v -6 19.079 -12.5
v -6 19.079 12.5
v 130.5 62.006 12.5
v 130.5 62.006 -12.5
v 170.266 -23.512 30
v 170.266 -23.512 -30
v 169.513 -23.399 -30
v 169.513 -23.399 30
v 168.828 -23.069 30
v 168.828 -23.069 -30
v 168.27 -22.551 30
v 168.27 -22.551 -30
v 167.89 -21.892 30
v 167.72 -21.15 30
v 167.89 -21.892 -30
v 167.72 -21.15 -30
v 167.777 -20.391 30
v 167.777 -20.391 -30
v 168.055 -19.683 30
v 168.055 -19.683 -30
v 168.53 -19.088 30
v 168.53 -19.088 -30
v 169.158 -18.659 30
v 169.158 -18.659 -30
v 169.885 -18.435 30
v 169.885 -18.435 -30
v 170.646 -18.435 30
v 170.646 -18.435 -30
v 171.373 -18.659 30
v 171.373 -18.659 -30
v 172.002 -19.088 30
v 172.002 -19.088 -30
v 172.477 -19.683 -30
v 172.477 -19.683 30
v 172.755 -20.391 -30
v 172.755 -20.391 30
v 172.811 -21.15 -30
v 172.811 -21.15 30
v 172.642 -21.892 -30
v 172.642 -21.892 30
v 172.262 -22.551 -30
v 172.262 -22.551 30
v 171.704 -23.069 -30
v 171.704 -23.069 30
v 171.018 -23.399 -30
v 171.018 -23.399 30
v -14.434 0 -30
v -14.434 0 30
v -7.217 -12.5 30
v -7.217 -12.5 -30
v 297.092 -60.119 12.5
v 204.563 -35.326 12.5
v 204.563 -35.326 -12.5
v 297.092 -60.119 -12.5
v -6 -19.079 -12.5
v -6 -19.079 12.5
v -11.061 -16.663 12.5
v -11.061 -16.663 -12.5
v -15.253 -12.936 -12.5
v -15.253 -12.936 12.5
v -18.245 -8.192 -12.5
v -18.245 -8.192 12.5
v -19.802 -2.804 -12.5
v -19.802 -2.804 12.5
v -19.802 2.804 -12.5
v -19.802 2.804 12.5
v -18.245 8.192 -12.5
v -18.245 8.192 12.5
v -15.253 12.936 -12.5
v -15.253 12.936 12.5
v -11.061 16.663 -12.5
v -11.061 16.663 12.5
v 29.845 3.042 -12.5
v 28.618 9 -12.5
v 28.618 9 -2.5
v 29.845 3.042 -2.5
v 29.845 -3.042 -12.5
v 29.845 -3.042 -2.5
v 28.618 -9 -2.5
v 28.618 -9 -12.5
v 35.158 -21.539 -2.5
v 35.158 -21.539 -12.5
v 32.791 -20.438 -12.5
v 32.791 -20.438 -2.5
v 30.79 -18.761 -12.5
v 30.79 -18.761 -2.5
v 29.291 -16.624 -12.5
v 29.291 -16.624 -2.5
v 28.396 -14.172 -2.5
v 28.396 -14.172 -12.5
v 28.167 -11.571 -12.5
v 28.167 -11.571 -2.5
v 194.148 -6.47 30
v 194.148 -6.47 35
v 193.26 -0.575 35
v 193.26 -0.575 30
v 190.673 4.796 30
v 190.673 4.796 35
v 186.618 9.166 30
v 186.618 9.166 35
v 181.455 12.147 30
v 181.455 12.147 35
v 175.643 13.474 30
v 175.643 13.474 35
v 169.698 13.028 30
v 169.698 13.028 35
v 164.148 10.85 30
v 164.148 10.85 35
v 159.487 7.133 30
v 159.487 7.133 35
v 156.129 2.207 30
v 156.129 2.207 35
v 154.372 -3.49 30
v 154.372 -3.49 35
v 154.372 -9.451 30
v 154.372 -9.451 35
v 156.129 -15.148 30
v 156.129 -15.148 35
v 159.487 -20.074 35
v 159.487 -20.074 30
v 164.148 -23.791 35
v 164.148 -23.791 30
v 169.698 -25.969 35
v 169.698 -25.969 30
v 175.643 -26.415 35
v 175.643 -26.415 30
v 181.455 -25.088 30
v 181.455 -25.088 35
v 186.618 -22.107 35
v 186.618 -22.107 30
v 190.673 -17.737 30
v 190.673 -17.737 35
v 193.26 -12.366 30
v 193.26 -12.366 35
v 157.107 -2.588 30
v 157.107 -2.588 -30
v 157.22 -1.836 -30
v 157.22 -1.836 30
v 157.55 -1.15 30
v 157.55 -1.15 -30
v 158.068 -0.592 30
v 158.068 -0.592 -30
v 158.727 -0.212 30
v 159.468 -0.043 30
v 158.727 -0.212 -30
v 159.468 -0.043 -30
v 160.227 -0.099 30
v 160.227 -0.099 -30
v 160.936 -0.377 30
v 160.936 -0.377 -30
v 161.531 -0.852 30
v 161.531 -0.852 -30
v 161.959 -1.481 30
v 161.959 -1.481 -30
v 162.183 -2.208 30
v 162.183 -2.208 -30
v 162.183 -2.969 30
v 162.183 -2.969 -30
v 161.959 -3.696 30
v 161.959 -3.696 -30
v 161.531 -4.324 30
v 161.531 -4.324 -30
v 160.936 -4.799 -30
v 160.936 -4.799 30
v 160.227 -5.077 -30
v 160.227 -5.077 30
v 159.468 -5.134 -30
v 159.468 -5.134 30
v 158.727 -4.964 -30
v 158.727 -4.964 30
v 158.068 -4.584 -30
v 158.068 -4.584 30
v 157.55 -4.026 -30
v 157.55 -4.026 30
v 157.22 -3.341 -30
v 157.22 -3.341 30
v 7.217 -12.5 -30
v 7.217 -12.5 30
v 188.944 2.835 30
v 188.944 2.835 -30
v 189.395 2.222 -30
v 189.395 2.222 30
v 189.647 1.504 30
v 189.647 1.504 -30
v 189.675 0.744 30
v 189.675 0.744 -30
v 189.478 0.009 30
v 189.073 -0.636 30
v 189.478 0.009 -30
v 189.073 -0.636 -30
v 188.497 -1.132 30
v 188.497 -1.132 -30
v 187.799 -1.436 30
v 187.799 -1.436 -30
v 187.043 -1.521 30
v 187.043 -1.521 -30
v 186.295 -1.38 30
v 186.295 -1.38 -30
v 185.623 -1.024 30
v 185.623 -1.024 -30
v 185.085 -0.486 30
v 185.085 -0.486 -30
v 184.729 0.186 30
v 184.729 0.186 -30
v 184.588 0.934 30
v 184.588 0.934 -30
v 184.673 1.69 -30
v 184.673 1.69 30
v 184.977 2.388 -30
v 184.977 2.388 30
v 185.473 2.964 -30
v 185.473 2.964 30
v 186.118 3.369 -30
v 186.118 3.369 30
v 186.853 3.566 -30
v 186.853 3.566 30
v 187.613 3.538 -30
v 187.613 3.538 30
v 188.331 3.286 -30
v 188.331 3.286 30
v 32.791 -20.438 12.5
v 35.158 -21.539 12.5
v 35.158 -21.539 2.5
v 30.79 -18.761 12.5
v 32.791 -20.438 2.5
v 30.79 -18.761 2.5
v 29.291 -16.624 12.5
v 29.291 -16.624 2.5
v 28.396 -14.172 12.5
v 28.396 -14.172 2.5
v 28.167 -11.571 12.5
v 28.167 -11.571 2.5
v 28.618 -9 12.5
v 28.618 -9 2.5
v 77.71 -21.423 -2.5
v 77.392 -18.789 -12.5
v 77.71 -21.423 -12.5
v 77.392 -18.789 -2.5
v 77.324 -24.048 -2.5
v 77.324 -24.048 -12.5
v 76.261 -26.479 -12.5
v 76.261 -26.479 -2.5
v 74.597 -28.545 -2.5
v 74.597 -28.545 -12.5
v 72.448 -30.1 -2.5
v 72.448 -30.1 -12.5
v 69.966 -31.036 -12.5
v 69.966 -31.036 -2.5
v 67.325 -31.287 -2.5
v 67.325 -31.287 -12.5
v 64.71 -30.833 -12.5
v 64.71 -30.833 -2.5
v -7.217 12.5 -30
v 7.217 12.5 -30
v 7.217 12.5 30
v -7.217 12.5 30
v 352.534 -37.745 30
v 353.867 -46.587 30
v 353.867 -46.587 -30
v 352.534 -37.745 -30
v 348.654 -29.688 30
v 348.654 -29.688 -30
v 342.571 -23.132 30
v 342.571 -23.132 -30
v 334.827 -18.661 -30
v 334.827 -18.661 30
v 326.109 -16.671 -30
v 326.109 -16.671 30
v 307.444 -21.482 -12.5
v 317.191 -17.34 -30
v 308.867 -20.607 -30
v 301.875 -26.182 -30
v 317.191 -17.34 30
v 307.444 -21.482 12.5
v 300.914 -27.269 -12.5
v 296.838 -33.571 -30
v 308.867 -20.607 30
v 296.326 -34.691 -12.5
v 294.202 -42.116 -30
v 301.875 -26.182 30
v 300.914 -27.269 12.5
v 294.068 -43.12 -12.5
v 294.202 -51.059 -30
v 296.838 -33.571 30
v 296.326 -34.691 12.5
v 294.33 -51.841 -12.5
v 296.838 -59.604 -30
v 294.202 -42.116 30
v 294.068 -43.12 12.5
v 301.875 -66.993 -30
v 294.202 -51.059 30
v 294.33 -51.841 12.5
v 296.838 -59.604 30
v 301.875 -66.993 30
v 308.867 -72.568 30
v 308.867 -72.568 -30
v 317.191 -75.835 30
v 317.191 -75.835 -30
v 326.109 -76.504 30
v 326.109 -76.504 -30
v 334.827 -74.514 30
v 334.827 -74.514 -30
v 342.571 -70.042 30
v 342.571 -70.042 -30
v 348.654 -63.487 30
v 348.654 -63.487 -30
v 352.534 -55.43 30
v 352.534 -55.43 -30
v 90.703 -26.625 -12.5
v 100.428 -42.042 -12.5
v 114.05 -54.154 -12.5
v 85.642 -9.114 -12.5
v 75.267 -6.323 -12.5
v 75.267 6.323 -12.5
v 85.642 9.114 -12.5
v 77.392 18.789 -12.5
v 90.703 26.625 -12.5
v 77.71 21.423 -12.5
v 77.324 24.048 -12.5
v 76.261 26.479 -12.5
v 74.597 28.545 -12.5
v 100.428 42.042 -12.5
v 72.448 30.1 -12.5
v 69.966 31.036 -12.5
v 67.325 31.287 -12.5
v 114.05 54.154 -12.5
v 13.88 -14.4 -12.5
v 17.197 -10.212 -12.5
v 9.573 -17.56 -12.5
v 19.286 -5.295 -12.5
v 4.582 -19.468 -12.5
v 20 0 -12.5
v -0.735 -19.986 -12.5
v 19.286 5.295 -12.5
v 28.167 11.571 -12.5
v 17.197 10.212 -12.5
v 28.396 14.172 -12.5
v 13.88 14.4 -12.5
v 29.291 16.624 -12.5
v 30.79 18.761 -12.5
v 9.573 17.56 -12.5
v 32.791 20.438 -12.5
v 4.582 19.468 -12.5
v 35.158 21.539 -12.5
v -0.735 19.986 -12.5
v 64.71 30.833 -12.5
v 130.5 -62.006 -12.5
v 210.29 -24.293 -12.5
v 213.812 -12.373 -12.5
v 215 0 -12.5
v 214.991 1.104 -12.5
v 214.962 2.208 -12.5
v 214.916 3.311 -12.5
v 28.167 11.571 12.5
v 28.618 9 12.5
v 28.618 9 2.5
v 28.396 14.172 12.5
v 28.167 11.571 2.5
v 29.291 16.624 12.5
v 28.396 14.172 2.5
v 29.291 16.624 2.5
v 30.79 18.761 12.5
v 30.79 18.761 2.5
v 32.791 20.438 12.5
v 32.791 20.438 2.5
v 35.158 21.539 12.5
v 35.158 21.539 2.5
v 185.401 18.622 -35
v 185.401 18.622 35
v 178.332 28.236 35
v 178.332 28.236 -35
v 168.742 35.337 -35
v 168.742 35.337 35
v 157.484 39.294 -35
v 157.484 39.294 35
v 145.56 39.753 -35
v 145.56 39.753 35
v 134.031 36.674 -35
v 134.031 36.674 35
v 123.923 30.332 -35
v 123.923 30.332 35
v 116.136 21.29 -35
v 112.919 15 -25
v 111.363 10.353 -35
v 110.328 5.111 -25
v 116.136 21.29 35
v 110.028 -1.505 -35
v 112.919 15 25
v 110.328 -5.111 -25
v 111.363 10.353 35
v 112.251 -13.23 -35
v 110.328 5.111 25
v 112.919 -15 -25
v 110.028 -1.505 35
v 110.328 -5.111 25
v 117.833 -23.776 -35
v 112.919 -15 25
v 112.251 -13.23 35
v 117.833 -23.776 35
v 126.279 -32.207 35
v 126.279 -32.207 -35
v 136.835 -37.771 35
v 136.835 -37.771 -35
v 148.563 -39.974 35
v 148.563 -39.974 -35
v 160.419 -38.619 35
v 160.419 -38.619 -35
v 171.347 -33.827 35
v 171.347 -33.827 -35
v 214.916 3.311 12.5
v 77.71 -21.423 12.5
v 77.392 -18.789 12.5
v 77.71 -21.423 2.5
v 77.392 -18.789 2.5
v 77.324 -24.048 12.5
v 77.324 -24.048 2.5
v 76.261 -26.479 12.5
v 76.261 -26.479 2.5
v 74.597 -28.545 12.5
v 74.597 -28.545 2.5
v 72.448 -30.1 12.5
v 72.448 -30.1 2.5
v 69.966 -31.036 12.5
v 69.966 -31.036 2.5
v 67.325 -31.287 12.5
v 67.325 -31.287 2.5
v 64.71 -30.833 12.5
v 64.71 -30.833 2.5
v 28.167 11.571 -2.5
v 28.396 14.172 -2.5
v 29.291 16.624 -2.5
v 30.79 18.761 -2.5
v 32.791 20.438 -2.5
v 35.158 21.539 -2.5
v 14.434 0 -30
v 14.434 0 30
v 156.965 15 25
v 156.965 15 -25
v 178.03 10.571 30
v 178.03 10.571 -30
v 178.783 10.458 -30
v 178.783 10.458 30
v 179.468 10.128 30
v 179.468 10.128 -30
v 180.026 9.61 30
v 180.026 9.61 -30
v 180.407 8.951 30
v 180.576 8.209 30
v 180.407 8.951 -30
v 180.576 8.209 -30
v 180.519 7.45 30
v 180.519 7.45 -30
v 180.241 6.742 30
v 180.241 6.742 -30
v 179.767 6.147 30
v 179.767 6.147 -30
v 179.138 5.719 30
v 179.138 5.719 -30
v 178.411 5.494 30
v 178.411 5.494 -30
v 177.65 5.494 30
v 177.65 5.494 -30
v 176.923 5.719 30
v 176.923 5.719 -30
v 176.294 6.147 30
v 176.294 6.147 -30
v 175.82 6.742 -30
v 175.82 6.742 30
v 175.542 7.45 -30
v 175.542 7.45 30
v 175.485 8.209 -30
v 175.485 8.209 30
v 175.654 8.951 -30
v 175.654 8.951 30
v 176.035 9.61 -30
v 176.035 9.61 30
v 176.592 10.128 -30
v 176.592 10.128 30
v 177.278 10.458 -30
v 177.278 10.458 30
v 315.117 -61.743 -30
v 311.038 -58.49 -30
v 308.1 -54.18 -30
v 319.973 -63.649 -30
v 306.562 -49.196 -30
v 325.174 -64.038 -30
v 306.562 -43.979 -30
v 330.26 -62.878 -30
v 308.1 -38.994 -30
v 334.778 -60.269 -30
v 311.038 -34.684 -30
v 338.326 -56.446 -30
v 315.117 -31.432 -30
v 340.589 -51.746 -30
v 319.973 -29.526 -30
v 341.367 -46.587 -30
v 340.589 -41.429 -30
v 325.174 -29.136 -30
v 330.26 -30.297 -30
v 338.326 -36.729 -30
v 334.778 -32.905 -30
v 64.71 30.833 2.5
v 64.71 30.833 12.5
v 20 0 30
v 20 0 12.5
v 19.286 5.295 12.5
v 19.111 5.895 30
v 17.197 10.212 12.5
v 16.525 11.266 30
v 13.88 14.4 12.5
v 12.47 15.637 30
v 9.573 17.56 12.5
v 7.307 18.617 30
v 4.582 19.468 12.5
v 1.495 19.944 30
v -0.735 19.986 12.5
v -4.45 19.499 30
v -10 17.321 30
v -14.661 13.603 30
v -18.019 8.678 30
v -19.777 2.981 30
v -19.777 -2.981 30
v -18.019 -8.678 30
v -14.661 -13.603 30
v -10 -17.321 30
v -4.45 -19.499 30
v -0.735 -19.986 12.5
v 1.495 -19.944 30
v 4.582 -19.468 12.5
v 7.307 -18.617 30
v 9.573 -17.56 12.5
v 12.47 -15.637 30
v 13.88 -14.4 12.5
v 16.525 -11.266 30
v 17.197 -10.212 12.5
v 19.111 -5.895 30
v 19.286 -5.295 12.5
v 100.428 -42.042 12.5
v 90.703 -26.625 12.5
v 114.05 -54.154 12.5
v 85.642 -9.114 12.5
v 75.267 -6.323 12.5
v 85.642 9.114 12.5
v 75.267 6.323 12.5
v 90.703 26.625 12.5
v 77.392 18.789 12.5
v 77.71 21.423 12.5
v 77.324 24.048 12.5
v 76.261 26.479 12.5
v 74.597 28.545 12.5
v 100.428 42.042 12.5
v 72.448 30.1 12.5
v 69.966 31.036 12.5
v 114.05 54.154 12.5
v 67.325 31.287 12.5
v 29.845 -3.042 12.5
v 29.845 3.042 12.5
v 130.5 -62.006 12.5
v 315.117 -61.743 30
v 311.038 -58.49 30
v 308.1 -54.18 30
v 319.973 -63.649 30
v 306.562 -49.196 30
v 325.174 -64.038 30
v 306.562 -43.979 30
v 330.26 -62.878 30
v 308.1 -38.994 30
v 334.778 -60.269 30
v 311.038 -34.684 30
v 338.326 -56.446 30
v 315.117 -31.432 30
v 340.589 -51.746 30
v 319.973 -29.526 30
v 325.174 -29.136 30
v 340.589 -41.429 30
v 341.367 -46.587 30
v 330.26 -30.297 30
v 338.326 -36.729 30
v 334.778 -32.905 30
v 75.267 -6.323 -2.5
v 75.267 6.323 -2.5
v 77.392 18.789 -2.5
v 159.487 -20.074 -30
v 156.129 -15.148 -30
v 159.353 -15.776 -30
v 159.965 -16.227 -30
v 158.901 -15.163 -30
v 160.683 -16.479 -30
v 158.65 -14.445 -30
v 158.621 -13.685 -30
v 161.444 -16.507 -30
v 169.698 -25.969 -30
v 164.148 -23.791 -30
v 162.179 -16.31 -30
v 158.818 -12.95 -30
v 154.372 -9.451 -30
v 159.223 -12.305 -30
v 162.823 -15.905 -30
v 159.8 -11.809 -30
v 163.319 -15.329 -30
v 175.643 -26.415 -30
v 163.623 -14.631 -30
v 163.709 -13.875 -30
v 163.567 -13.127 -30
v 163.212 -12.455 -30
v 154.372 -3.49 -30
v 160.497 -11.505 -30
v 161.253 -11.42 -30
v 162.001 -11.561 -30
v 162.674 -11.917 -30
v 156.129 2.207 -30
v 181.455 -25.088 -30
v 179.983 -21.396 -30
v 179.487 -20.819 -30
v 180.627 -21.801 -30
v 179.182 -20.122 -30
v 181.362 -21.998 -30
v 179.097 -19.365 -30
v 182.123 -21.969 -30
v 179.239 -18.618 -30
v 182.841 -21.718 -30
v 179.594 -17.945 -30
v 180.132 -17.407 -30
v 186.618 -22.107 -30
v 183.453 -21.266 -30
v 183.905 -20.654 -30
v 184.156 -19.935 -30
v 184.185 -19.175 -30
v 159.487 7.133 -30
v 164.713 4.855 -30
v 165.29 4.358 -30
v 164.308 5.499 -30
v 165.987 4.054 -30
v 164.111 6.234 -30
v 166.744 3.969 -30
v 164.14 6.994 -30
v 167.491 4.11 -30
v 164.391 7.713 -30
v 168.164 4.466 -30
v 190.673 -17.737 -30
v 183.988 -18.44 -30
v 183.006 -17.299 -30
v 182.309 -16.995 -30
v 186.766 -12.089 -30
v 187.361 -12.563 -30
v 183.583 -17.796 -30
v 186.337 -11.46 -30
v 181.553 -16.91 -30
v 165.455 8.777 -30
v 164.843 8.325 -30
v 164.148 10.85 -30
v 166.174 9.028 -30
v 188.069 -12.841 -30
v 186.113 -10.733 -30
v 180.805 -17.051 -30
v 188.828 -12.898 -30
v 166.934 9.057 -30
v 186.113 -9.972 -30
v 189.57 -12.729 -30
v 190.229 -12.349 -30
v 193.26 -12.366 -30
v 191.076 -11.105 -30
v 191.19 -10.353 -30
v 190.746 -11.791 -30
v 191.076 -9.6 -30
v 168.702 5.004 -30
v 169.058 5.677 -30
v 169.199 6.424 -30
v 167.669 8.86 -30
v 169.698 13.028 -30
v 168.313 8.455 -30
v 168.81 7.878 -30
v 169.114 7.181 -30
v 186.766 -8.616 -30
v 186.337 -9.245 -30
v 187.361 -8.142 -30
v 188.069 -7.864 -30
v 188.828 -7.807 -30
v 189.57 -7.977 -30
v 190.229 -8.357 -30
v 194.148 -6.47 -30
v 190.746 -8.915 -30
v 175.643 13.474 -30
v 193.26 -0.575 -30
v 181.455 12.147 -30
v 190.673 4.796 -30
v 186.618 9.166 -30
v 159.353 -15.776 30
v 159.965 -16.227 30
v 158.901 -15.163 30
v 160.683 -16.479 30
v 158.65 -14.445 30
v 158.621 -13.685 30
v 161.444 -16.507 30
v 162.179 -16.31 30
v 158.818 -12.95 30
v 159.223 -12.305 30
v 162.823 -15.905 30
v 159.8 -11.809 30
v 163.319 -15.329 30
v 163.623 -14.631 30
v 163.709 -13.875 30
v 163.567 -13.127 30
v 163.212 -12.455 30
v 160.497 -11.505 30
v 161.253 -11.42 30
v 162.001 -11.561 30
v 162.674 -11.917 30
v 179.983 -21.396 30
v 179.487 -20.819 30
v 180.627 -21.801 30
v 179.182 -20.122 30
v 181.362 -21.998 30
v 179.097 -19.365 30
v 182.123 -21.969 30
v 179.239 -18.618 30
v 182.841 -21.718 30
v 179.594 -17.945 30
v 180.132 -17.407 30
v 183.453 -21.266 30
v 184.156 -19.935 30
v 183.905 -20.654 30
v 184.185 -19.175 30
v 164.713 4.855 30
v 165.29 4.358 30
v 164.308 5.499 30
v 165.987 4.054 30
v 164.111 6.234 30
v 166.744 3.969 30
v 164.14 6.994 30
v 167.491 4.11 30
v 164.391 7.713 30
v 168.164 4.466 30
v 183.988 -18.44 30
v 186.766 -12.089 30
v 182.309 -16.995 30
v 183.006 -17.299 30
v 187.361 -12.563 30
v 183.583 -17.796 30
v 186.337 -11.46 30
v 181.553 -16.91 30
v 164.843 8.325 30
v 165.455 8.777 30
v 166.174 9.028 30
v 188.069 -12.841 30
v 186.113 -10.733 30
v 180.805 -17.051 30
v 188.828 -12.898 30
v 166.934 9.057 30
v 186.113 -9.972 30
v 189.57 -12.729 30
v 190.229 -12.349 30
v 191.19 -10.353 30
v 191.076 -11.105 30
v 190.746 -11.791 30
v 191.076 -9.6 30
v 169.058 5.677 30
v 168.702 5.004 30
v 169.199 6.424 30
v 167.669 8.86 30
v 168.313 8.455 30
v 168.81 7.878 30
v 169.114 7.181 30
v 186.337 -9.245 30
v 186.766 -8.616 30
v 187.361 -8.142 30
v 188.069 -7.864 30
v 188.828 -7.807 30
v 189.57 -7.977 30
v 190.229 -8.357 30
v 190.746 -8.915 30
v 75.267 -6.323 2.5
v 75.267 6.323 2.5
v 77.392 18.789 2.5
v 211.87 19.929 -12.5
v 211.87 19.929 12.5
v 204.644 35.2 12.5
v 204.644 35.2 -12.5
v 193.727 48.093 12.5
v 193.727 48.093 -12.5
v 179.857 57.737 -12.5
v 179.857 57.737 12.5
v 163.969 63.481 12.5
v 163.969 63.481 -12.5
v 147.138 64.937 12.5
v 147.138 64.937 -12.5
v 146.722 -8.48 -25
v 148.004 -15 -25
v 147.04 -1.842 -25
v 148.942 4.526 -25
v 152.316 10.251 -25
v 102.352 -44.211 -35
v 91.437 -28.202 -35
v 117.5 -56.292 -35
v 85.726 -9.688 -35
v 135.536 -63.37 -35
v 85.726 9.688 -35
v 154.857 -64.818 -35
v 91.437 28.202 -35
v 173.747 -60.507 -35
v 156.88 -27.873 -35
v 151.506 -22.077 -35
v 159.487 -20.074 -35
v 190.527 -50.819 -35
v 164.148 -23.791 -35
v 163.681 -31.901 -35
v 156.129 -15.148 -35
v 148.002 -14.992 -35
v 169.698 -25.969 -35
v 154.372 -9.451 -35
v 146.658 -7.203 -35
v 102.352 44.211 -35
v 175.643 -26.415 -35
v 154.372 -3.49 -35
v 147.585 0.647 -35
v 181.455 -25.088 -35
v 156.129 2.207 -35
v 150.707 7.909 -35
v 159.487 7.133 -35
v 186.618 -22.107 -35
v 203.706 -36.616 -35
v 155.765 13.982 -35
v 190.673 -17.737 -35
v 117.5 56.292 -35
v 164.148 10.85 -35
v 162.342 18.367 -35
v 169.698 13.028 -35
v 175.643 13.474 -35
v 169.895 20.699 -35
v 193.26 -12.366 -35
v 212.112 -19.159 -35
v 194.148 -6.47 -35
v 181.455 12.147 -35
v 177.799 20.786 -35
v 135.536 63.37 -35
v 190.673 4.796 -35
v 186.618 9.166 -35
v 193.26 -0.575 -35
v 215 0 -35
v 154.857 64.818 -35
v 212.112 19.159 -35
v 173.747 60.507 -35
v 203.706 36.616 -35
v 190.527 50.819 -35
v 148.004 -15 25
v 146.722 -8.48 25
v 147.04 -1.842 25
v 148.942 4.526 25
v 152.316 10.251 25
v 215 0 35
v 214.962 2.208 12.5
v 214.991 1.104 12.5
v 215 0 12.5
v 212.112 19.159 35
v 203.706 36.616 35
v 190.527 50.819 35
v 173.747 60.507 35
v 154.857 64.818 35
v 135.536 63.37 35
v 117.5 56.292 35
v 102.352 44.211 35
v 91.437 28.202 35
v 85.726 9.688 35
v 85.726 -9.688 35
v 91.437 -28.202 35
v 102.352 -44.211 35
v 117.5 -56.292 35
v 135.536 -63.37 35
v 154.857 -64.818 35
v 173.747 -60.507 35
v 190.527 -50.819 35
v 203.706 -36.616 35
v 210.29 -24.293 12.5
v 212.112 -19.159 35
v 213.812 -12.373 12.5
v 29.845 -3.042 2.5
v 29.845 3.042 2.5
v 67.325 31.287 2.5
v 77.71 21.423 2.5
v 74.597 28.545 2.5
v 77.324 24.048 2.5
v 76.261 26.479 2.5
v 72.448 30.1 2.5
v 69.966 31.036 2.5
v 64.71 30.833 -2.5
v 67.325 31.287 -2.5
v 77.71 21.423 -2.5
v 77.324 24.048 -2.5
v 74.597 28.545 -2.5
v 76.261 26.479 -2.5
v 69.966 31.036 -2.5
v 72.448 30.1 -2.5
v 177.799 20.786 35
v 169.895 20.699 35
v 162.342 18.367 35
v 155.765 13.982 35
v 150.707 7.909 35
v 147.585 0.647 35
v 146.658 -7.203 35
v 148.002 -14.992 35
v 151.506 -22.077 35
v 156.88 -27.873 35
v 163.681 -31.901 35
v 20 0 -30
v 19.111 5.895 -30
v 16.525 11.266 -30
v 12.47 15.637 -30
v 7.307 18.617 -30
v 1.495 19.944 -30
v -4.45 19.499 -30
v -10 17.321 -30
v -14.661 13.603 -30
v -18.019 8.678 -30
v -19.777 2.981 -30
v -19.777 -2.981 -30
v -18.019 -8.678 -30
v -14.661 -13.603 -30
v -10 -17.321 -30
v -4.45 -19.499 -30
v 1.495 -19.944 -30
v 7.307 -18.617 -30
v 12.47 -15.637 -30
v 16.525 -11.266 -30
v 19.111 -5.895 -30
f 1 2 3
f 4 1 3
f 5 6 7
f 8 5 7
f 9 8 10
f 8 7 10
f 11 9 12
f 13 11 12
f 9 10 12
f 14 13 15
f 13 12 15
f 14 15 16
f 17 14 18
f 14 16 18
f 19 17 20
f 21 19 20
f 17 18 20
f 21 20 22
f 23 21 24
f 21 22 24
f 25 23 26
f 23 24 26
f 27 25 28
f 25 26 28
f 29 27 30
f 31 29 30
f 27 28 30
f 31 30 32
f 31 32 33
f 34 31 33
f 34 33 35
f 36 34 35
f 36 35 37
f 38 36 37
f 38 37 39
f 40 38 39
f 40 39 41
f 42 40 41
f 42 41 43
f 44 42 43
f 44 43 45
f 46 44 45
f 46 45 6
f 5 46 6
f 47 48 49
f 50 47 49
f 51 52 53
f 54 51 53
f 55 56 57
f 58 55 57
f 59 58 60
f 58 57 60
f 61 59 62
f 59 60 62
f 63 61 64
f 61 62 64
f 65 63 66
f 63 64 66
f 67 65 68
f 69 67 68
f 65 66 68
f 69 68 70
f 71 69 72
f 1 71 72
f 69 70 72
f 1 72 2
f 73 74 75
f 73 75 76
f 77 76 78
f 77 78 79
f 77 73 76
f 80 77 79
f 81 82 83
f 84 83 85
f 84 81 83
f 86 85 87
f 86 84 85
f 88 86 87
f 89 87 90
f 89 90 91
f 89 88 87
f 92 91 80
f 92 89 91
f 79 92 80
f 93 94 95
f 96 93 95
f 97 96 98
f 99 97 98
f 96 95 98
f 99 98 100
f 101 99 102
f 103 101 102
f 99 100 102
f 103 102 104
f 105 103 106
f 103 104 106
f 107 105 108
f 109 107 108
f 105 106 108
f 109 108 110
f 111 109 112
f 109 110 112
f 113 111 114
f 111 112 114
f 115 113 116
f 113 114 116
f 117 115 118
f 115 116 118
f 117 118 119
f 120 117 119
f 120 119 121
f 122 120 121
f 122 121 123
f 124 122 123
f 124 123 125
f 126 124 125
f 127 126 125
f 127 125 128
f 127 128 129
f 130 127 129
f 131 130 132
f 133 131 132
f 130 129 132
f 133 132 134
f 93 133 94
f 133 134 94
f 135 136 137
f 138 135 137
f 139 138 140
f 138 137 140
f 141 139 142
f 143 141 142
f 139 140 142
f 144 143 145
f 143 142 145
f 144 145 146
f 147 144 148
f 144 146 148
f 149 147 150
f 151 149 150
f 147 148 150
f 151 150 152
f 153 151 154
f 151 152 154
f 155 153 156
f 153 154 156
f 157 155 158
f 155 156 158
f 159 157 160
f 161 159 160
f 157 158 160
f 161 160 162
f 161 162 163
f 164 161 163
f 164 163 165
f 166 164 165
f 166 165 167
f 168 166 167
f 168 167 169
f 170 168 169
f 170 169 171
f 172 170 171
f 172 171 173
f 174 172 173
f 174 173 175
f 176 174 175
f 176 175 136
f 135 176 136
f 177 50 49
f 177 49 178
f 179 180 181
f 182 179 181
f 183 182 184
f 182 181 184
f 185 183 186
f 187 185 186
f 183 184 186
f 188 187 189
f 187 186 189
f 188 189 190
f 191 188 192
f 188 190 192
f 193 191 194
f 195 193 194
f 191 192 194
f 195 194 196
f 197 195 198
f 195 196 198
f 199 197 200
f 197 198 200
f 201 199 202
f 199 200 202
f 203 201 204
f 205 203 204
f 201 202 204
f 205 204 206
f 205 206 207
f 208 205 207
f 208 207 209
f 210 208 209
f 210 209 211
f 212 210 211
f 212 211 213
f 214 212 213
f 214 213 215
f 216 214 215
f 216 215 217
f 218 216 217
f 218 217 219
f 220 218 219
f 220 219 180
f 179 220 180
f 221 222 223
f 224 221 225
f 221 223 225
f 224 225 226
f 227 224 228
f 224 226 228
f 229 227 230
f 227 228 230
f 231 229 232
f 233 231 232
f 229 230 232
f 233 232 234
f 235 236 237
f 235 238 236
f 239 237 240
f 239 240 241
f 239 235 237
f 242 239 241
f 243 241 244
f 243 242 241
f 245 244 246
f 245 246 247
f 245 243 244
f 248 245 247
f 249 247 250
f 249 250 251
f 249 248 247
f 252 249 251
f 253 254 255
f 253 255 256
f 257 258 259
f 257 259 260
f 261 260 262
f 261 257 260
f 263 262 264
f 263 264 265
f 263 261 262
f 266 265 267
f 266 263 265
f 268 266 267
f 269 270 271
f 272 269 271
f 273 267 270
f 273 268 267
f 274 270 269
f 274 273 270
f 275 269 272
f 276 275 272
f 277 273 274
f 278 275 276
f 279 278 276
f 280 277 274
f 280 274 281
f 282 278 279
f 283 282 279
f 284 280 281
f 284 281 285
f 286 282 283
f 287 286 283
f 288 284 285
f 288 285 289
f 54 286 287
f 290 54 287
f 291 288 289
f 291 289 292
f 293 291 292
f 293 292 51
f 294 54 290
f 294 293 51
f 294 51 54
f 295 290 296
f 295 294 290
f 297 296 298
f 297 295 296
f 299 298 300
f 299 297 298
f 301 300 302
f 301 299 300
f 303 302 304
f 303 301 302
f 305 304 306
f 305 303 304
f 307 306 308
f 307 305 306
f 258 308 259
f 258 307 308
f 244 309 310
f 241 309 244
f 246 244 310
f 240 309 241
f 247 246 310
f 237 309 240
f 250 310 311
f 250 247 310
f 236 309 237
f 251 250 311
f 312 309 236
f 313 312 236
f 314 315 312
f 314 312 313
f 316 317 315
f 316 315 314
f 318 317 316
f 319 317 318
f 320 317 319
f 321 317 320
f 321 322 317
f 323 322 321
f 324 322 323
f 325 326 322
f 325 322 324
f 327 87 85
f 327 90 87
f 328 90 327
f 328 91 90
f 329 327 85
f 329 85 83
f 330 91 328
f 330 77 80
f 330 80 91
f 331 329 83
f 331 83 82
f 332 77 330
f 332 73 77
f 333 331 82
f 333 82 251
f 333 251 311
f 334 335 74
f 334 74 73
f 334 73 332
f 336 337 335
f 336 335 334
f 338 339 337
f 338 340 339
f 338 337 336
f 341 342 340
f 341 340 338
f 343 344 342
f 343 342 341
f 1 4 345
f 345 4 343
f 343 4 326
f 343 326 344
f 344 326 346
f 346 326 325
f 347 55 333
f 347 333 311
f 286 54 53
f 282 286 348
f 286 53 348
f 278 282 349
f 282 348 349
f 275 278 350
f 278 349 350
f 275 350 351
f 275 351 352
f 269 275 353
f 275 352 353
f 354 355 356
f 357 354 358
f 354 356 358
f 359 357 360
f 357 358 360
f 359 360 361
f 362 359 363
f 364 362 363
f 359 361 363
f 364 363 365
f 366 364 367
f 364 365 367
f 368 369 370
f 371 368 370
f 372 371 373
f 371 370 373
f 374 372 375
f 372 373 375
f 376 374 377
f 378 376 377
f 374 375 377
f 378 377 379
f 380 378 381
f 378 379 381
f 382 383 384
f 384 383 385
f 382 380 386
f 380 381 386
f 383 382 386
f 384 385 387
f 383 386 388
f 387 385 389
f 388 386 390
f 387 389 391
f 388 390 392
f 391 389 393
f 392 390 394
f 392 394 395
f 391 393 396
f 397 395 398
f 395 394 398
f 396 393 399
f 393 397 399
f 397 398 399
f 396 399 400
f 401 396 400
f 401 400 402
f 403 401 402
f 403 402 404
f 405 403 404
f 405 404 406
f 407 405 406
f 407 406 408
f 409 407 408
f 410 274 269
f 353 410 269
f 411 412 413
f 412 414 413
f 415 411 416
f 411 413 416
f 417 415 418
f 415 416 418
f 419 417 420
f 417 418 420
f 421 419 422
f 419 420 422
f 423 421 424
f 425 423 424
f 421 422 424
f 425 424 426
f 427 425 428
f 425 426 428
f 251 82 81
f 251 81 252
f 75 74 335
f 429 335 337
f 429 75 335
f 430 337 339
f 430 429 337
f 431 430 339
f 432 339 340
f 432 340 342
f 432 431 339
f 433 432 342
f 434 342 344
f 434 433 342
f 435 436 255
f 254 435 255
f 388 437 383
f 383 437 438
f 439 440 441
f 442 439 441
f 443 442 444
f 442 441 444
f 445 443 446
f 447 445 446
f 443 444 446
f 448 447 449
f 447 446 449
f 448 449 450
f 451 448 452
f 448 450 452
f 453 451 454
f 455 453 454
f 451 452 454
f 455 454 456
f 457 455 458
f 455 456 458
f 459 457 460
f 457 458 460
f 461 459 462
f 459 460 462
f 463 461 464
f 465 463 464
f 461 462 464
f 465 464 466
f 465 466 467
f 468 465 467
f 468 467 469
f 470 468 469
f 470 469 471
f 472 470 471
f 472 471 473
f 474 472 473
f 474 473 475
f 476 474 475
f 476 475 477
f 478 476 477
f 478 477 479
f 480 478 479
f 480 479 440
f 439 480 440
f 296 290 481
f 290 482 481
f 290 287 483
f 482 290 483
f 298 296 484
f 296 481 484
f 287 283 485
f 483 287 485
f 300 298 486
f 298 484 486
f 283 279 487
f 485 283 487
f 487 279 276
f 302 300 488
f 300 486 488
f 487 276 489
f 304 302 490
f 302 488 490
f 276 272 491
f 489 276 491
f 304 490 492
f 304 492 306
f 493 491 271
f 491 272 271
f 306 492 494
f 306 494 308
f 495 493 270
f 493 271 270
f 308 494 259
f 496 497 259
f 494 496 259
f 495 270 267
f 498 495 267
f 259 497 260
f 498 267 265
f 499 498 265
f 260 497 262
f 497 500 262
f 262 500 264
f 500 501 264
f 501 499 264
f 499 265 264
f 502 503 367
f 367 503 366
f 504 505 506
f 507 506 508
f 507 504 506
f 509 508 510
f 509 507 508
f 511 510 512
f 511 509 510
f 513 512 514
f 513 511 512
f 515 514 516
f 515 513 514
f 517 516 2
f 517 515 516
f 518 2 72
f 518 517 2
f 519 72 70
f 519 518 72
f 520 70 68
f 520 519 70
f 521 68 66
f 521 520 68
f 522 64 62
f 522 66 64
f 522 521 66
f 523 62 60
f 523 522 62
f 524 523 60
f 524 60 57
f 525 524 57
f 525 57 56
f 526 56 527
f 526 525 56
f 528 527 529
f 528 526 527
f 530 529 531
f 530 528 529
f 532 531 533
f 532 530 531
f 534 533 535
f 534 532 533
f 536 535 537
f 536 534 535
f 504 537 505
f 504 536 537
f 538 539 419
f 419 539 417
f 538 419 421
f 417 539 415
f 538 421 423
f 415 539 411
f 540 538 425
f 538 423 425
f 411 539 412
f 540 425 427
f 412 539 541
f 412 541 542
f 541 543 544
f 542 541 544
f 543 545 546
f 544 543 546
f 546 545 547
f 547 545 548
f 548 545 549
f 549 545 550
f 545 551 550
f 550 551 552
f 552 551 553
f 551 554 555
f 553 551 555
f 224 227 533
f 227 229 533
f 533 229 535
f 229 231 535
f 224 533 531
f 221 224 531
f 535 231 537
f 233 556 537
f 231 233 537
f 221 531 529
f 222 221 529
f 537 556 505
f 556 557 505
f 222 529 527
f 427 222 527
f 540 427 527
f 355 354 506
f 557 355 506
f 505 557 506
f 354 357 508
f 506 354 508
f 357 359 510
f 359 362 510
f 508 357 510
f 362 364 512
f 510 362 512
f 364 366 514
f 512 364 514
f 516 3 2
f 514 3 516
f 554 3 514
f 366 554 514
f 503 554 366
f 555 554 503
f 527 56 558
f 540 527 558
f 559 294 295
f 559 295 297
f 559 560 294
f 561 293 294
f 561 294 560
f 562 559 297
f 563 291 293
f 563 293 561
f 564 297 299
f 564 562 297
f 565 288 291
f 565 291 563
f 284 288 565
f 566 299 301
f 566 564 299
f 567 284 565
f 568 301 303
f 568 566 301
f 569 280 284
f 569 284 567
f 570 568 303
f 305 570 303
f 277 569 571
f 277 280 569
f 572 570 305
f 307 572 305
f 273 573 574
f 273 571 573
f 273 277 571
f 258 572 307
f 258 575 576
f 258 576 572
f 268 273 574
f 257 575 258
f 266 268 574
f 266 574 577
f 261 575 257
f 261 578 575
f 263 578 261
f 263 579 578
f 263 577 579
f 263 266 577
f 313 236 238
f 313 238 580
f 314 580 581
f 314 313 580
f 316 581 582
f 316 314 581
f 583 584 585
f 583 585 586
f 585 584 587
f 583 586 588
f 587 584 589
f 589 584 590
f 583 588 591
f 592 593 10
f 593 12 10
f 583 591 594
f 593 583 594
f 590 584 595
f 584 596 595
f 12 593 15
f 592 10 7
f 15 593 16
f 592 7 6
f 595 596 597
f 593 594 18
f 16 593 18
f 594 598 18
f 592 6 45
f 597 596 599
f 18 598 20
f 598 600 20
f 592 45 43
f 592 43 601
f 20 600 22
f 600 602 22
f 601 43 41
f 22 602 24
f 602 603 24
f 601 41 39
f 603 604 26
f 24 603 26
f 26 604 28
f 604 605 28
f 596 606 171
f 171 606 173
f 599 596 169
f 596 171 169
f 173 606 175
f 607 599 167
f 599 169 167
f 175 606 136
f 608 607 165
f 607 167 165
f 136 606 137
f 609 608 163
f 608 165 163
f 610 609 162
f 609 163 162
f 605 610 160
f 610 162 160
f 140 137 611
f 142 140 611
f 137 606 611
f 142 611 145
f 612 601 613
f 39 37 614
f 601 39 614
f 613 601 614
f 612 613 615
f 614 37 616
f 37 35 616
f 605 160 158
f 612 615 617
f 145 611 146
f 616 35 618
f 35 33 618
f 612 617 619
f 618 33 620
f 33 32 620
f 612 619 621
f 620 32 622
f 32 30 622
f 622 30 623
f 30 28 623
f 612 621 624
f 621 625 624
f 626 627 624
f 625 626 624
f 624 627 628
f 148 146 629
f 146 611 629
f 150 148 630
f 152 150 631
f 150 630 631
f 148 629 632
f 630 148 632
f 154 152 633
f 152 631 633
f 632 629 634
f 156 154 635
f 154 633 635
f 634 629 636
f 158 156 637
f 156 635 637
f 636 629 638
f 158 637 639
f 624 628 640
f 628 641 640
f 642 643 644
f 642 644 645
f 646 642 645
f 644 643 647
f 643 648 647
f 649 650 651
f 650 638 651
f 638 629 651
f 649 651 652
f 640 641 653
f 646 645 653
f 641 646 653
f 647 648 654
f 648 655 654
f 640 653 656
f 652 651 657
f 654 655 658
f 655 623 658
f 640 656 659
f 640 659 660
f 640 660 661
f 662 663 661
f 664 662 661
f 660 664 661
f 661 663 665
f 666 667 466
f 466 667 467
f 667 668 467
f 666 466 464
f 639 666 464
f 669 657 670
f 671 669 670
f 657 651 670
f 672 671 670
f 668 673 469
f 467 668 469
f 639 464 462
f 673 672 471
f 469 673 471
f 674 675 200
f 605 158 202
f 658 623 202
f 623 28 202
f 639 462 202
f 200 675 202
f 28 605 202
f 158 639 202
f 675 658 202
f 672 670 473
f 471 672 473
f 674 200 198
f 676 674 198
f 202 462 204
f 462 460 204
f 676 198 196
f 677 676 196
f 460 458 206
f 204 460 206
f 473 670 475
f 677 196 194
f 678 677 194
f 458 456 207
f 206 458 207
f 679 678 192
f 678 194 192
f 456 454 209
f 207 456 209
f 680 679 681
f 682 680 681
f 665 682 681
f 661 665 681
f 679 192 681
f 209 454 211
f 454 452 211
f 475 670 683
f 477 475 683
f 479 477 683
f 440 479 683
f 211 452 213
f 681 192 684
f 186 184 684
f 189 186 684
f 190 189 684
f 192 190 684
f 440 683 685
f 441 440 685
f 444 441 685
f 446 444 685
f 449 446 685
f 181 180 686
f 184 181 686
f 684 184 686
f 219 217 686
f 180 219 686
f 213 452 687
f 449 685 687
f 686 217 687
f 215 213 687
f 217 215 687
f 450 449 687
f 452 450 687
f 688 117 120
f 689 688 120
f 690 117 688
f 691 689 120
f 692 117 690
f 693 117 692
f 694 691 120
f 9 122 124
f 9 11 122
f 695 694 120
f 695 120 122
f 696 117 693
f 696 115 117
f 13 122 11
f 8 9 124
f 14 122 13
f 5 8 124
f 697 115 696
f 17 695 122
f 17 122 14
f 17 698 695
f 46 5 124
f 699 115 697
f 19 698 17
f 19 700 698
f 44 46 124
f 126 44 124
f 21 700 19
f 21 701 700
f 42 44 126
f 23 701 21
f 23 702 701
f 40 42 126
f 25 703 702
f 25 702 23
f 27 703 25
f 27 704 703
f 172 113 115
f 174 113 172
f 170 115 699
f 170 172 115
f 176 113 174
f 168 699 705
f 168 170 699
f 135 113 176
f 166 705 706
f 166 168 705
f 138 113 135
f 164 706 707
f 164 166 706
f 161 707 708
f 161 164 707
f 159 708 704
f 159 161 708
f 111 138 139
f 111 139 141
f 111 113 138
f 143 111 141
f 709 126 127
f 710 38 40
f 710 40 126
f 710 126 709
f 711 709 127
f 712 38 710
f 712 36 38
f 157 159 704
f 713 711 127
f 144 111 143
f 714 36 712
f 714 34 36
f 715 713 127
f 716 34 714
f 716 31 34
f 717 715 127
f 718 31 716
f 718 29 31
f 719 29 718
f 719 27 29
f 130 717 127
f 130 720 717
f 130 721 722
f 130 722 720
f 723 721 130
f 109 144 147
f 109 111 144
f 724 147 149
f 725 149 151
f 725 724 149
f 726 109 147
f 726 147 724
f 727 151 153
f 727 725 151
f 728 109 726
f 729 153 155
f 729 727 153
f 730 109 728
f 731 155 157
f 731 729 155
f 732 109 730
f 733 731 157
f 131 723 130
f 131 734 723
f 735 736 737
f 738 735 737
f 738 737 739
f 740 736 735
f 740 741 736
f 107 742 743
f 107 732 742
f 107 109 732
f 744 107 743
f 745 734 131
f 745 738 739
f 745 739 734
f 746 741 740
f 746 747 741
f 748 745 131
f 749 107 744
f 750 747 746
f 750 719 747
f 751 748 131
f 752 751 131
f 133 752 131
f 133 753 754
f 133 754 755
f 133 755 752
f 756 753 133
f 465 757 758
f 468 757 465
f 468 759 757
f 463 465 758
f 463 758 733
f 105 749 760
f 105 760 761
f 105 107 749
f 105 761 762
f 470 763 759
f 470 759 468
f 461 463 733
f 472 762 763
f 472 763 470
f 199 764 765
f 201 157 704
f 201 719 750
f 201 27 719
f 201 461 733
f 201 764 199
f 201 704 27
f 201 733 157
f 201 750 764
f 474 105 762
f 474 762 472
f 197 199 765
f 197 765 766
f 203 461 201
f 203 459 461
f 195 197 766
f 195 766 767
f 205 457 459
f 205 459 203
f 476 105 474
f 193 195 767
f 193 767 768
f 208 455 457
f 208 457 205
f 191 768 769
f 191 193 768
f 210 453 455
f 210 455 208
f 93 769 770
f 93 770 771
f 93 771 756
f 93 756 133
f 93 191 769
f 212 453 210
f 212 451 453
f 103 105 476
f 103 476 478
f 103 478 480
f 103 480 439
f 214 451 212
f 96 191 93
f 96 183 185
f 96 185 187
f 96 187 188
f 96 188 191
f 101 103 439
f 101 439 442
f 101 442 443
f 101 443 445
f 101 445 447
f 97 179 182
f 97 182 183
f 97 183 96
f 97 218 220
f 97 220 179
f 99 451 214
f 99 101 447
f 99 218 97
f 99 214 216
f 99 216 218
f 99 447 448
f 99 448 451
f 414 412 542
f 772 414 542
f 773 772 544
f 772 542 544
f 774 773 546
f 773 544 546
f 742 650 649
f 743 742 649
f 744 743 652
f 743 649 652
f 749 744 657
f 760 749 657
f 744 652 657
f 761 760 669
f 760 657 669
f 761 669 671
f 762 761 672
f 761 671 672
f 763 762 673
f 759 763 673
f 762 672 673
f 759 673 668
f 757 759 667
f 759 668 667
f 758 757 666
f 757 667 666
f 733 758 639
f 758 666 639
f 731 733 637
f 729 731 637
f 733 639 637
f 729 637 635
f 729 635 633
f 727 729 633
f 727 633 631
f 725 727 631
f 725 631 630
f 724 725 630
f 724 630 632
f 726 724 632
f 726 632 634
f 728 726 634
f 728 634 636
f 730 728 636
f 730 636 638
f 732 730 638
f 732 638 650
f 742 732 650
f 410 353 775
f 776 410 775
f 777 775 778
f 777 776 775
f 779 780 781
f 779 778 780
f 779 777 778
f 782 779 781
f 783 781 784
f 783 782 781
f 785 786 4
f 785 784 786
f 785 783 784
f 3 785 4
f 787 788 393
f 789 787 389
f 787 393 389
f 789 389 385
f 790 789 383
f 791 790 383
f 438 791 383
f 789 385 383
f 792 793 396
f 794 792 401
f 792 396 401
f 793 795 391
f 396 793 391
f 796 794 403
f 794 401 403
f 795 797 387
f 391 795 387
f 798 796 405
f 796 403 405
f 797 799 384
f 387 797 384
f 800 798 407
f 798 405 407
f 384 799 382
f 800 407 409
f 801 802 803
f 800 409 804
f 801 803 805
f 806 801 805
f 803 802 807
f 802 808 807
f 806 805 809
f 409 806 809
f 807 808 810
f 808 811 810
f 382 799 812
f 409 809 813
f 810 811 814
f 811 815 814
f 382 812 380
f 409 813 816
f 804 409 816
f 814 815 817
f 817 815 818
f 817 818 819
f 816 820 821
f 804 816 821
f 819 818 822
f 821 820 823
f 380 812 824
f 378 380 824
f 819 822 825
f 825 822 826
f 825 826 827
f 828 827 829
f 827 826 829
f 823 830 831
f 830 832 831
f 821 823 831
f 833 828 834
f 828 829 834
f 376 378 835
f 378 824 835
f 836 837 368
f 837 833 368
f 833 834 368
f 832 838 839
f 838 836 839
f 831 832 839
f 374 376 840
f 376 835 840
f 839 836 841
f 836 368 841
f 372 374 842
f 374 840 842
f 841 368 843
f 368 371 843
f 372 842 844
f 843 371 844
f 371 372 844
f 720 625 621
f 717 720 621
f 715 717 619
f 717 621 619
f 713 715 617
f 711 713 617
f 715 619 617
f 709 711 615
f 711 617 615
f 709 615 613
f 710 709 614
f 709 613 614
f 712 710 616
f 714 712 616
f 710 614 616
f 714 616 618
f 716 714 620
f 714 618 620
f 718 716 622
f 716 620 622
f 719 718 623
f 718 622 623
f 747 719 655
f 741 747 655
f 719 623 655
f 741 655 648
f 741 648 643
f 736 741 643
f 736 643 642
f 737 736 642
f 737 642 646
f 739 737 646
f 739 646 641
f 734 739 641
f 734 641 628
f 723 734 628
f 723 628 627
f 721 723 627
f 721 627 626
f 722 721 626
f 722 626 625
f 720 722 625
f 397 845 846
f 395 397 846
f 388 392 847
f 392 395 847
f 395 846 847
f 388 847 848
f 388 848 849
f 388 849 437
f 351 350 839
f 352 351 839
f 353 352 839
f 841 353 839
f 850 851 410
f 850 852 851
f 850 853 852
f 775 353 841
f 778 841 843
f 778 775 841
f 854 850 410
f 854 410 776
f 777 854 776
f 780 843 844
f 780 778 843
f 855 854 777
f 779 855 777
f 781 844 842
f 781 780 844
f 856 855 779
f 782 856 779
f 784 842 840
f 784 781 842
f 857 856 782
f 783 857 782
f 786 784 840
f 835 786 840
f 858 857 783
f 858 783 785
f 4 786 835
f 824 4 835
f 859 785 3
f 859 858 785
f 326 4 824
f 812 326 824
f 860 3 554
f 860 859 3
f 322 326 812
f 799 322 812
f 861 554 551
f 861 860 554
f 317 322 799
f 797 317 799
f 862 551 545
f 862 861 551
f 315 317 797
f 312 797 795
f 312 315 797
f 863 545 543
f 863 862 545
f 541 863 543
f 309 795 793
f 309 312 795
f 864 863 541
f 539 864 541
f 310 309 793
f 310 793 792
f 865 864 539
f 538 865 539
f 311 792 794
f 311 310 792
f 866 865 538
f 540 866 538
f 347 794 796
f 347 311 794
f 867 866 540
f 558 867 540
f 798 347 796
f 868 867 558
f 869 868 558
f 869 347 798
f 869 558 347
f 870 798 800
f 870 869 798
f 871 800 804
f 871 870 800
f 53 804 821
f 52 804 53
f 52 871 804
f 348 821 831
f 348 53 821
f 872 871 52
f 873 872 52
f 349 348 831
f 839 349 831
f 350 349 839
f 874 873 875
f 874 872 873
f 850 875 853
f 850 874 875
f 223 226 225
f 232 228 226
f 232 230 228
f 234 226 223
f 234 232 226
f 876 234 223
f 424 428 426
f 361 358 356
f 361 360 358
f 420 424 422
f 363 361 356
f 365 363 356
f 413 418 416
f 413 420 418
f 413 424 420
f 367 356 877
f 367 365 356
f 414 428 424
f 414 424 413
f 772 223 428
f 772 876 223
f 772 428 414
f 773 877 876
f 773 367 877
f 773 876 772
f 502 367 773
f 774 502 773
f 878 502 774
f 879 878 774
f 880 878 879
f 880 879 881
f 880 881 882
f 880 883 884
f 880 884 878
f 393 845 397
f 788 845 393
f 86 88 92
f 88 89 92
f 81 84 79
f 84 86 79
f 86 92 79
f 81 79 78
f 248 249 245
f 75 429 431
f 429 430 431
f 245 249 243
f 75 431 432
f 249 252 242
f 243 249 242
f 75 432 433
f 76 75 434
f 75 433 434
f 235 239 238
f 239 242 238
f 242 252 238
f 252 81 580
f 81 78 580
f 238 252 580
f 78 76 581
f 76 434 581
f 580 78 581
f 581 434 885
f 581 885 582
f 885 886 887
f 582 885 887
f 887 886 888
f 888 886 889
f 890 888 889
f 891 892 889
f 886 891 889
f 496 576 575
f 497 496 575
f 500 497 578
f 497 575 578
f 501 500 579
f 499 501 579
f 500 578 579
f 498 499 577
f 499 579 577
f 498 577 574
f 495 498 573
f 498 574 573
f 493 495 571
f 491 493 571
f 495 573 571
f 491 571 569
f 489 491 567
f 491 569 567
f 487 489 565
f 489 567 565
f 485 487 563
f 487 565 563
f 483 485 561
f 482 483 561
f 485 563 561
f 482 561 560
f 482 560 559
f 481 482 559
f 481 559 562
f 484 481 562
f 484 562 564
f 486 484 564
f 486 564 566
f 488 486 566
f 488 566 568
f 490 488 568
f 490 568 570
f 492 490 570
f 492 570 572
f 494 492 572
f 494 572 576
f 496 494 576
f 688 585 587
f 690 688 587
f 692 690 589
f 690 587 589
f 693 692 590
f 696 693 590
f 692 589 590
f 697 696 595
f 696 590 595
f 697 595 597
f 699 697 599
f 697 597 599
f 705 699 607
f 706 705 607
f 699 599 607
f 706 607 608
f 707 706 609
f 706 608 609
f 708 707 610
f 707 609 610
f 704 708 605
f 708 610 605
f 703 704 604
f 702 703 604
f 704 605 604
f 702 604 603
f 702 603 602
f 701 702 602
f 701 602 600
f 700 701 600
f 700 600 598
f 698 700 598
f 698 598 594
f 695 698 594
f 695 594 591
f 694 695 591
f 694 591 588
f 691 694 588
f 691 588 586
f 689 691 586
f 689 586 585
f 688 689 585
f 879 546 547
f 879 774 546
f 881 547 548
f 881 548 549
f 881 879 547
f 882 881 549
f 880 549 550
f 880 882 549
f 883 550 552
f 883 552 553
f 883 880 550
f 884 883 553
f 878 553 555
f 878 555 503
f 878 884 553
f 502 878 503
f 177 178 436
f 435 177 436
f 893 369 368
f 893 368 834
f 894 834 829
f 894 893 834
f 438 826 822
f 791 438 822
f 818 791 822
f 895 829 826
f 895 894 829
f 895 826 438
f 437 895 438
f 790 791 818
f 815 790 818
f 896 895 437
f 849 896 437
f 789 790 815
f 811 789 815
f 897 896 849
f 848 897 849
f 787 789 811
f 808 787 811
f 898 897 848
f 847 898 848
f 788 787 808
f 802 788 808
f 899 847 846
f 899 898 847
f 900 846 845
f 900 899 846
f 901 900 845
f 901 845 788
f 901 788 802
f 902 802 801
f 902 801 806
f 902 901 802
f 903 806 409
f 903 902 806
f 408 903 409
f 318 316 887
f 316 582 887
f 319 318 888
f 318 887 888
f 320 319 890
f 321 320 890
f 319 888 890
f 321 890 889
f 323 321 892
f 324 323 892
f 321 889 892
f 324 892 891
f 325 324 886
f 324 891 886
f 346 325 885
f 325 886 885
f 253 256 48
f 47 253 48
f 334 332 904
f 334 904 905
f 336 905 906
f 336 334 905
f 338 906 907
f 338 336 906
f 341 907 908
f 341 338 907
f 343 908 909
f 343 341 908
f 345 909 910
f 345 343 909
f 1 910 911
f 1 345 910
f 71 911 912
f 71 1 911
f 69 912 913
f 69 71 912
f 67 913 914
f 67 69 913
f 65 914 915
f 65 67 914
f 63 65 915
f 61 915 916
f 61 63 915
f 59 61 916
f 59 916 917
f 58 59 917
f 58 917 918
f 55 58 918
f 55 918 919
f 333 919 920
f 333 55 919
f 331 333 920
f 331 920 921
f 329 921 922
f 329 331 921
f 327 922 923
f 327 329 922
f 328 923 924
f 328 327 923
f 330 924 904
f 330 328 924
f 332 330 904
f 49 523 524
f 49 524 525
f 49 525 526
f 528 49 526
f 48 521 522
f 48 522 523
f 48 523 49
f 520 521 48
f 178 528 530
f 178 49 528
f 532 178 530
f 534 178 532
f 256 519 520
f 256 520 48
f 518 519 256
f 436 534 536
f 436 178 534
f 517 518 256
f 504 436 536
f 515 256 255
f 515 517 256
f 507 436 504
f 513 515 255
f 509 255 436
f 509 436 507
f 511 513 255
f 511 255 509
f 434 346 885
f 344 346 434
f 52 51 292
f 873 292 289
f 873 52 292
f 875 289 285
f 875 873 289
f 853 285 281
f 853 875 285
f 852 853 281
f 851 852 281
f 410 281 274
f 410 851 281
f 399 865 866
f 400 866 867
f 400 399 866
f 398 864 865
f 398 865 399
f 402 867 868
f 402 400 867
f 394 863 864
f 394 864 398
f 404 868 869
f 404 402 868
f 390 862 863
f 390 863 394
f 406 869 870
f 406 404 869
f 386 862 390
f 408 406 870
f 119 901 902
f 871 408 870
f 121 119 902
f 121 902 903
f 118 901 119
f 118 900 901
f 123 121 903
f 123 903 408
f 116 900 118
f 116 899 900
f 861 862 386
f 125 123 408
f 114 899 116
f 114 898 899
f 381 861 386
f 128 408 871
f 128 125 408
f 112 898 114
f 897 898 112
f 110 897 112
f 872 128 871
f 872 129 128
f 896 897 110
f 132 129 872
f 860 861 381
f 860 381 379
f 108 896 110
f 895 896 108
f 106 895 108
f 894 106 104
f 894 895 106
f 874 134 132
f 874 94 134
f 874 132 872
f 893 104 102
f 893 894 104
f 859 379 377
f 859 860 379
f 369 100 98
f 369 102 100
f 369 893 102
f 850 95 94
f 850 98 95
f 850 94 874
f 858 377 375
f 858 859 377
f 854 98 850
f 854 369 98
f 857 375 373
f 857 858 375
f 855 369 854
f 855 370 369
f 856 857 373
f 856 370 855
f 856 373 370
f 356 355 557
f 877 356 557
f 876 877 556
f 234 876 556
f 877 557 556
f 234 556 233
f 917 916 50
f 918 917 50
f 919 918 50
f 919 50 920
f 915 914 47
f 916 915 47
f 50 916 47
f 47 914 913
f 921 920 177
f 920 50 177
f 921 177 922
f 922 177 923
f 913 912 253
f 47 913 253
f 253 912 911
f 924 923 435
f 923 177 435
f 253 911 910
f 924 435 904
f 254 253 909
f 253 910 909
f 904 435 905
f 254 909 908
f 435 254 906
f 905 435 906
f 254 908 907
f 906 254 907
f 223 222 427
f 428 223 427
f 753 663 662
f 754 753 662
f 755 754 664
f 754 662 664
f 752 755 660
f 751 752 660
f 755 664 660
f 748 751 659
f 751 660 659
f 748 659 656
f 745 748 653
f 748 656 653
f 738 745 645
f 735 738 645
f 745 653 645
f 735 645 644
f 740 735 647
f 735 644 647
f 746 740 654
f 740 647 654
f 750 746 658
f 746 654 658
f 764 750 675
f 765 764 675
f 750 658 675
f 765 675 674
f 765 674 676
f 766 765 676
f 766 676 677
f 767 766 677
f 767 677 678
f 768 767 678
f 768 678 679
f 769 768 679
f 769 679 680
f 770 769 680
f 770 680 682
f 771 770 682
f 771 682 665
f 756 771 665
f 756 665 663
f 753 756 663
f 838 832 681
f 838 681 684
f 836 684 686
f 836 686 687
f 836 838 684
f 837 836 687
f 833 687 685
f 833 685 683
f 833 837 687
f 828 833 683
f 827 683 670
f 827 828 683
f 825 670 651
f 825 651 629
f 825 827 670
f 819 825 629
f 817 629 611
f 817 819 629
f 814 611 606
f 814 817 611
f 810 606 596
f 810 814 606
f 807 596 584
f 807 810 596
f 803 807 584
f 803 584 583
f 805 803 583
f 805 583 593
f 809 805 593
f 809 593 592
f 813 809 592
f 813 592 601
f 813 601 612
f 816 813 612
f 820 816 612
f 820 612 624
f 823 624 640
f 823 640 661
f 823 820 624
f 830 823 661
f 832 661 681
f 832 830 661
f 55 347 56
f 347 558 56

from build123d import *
from build123d.topology import SkipClean

# Parameters (mm, degrees)
LEFT_ARM_DEPTH                = 12.5
SKETCH2_R                     = 20
LEFT_BOSS_DEPTH               = 30
LEFT_HEX_DEPTH                = 233.486558751
LEFT_HEX_DEPTH_BACK           = 233.486558751
SKETCH3_R                     = 65
CENTRE_BOSS_DEPTH             = 35
SKETCH5_W                     = 25
SKETCH5_H                     = 40
RIGHT_ARM_DEPTH               = 180
SKETCH7_R                     = 30
RIGHT_BOSS_DEPTH              = 30
SKETCH8_R                     = 17.5
RIGHT_BOSS_HOLE_DEPTH         = 368.848119787
SKETCH9_R                     = 40
CENTRE_HOLE_DEPTH             = 369.764476639
SKETCH10_R                    = 27.5
CENTRE_BLOB_DEPTH             = 35
CENTRE_BEAM_REACH             = 222.573
SKETCH11_W                    = 50
SKETCH11_H                    = 30
CENTRE_BEAM_DIRECTION_2_REACH = 222.573
SKETCH12_R                    = 20
CUT_EXTRUDE4_DEPTH            = 5
F_1_4_20_TAPPED_HOLE1_D       = 5.1054
CIRPATTERN1_COUNT             = 8
CUT_OUT_DEPTH                 = 10
FILLET1_R                     = 10
FILLET1_OF_MIRROR2_R          = 10


with BuildPart() as part:
    # Sketch1 → LEFT_ARM (new, symmetric)
    with BuildSketch(Plane.XY):
        with BuildLine():
            Line((-6, 19.078784028), (130.5, 62.006048092))
            ThreePointArc((130.5, 62.006048092), (215, 0), (130.5, -62.006048092))
            Line((130.5, -62.006048092), (-6, -19.078784028))
            ThreePointArc((-6, -19.078784028), (-20, 0), (-6, 19.078784028))
        make_face()
    extrude(amount=LEFT_ARM_DEPTH, both=True)

    # Sketch2 → LEFT_Boss (add, symmetric)
    with SkipClean():  # the faces are left unmerged after this step: merging them gives an invalid solid
        with BuildSketch(Plane.XY):
            Circle(SKETCH2_R)
        extrude(amount=LEFT_BOSS_DEPTH, both=True)

    # Sketch4 → LEFT_Hex (cut, two sides: drawn at the far end of the back side and taken through both)
    with SkipClean():  # the faces are left unmerged after this step: merging them gives an invalid solid
        with BuildSketch(Plane.XY.offset(30).offset(-LEFT_HEX_DEPTH_BACK)):
            Polygon((14.43375673, 0), (7.216878365, 12.5), (-7.216878365, 12.5), (-14.43375673, 0), (-7.216878365, -12.5), (7.216878365, -12.5), align=None)
        extrude(amount=LEFT_HEX_DEPTH + LEFT_HEX_DEPTH_BACK, mode=Mode.SUBTRACT)

    # Sketch3 → CENTRE_Boss (add, symmetric)
    with SkipClean():  # the faces are left unmerged after this step: merging them gives an invalid solid
        with BuildSketch(Plane.XY):
            with Locations((150, 0)):
                Circle(SKETCH3_R)
        extrude(amount=CENTRE_BOSS_DEPTH, both=True)

    # Sketch5 → RIGHT_ARM (add)
    with SkipClean():  # the faces are left unmerged after this step: merging them gives an invalid solid
        with BuildSketch(Plane(origin=(139.951905284, -37.5, 0), x_dir=(0, 0, -1), z_dir=(0.9659258262890681, -0.25881904510252135, 0))):
            with Locations((0, 38.822856765)):
                Rectangle(SKETCH5_W, SKETCH5_H)
        extrude(amount=RIGHT_ARM_DEPTH)

    # Sketch7 → RIGHT_Boss (add, symmetric)
    with SkipClean():  # the faces are left unmerged after this step: merging them gives an invalid solid
        with BuildSketch(Plane.XY):
            with Locations((323.866648732, -46.587428118)):
                Circle(SKETCH7_R)
        extrude(amount=RIGHT_BOSS_DEPTH, both=True)
    add(part.part.scale(1), mode=Mode.REPLACE)  # the faces are merged on a copy

    # Sketch8 → RIGHT_Boss_Hole (cut, through all)
    with BuildSketch(Plane.XY.offset(30)):
        with Locations((323.866648732, -46.587428118)):
            Circle(SKETCH8_R)
    extrude(amount=-RIGHT_BOSS_HOLE_DEPTH, mode=Mode.SUBTRACT)

    # Sketch9 → CENTRE_Hole (cut, through all)
    with BuildSketch(Plane.XY.offset(35)):
        with Locations((150, 0)):
            Circle(SKETCH9_R)
    extrude(amount=-CENTRE_HOLE_DEPTH, mode=Mode.SUBTRACT)

    # Sketch10 → CENTRE_Blob (add, symmetric)
    with SkipClean():  # the faces are left unmerged after this step: merging them gives an invalid solid
        with BuildSketch(Plane.XY):
            with Locations((174.148145657, -6.470476128)):
                Circle(SKETCH10_R)
        extrude(amount=CENTRE_BLOB_DEPTH, both=True)

    # Sketch11 → CENTRE_Beam (add, up to next)
    with BuildSketch(Plane(origin=(150, 0, 0), x_dir=(0, 0, -1), z_dir=(1, 0, 0)), mode=Mode.PRIVATE) as centre_beam_sk1:
        Rectangle(SKETCH11_W, SKETCH11_H)
    centre_beam_tool1 = extrude(centre_beam_sk1.sketch, amount=CENTRE_BEAM_REACH, mode=Mode.PRIVATE) - part.part
    add(centre_beam_tool1.solids().sort_by_distance((150, 0, 0))[0])

    # Sketch11 → CENTRE_Beam direction 2 (add, up to next)
    with BuildSketch(Plane(origin=(150, 0, 0), x_dir=(0, 0, -1), z_dir=(1, 0, 0)), mode=Mode.PRIVATE) as centre_beam_direction_2_sk1:
        Rectangle(SKETCH11_W, SKETCH11_H)
    centre_beam_direction_2_tool1 = extrude(centre_beam_direction_2_sk1.sketch, amount=-CENTRE_BEAM_DIRECTION_2_REACH, mode=Mode.PRIVATE) - part.part
    add(centre_beam_direction_2_tool1.solids().sort_by_distance((150, 0, 0))[0])

    # Sketch12 → Cut-Extrude4 (cut)
    with BuildSketch(Plane.XY.offset(35)):
        with Locations((174.148145657, -6.470476128)):
            Circle(SKETCH12_R)
    cut_extrude4 = extrude(amount=-CUT_EXTRUDE4_DEPTH, mode=Mode.SUBTRACT)

    # 1/4-20 Tapped Hole1 (through all)
    with Locations(Plane.XY.offset(30)):
        with Locations((159.659258263, -2.588190451)):
            f_1_4_20_tapped_hole1 = Hole(F_1_4_20_TAPPED_HOLE1_D / 2)

    # CirPattern1: 1/4-20 Tapped Hole1 ×8 about axis
    cirpattern1_axis = Axis((174.148145657, -6.470476128, 0), (0, 0, 1))
    for i in range(1, CIRPATTERN1_COUNT):
        add(f_1_4_20_tapped_hole1.rotate(cirpattern1_axis, i * 360 / CIRPATTERN1_COUNT), mode=Mode.SUBTRACT)

    # Mirror1: Cut-Extrude4 across plane
    add(cut_extrude4.mirror(Plane.XY), mode=Mode.SUBTRACT)

    # Sketch15 → Cut_OUT (cut)
    with BuildSketch(Plane.XY.offset(12.5)):
        with BuildLine():
            Line((84.858453972, 37.169597537), (23.981475126, 18.024673388))
            ThreePointArc((23.981475126, 18.024673388), (30, 0), (23.981475126, -18.024673388))
            Line((23.981475126, -18.024673388), (84.858453972, -37.169597537))
            ThreePointArc((84.858453972, -37.169597537), (75, 0), (84.858453972, 37.169597537))
        make_face()
    cut_out = extrude(amount=-CUT_OUT_DEPTH, mode=Mode.SUBTRACT)

    # Fillet1
    fillet1_edges = [part.edges().sort_by_distance(p)[0] for p in [
        (23.981475126, -18.024673388, 7.5),
        (23.981475126, 18.024673388, 7.5),
        (84.858453972, 37.169597537, 7.5),
        (84.858453972, -37.169597537, 7.5),
    ]]
    fillet(fillet1_edges, radius=FILLET1_R)

    # Mirror2: Cut_OUT across plane
    with SkipClean():  # the faces are left unmerged after this step: merging them gives an invalid solid
        add(cut_out.mirror(Plane.XY), mode=Mode.SUBTRACT)

    # Fillet1 of Mirror2
    fillet1_of_mirror2_edges = [part.edges().sort_by_distance(p)[0] for p in [
        (23.981475126, -18.024673388, -7.5),
        (23.981475126, 18.024673388, -7.5),
        (84.858453972, 37.169597537, -7.5),
        (84.858453972, -37.169597537, -7.5),
    ]]
    fillet(fillet1_of_mirror2_edges, radius=FILLET1_OF_MIRROR2_R)


solid = part.part
